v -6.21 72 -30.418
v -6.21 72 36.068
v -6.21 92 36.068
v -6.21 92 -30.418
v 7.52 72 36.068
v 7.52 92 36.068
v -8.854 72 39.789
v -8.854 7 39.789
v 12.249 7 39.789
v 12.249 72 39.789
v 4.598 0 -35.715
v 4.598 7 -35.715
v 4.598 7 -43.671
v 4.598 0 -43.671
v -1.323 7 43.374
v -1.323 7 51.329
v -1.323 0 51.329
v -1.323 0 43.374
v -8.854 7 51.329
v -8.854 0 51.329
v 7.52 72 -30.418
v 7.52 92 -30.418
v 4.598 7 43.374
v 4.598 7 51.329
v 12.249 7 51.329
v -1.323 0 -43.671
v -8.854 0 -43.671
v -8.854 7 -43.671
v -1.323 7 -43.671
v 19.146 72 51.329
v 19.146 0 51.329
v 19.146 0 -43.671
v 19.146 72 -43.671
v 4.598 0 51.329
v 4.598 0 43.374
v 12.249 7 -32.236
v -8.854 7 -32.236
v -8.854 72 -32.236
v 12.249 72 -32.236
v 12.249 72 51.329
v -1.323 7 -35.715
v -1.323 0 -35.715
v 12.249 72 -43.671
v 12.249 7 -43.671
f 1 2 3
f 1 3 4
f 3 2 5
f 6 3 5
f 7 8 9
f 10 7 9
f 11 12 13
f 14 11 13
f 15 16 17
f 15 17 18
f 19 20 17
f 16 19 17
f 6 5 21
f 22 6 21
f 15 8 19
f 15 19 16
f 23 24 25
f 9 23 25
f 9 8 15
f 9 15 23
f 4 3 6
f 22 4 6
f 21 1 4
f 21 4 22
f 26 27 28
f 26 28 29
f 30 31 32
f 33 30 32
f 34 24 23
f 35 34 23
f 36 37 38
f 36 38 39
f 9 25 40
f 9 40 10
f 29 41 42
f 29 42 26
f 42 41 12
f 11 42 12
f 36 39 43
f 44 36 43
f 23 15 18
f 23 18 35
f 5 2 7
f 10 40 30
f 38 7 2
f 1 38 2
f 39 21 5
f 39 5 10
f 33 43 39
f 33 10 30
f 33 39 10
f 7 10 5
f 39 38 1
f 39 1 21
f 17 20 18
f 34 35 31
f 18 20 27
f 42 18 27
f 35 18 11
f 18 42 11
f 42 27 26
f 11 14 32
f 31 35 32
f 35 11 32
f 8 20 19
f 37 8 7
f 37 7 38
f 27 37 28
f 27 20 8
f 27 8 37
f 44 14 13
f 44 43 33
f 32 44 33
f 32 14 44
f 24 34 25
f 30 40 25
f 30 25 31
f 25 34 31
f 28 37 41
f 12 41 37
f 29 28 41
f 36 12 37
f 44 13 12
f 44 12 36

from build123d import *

# Parameters (mm, degrees)
SKETCH1_W           = 28
SKETCH1_H           = 95
BOSS_EXTRUDE1_DEPTH = 72
SKETCH2_W           = 13.730616592
SKETCH2_H           = 66.486096825
BOSS_EXTRUDE2_DEPTH = 20
SKETCH3_W           = 21.103215472
SKETCH3_H           = 11.539971669
SKETCH3_H_2         = 11.43433275
CUT_EXTRUDE1_DEPTH  = 65
SKETCH4_W           = 5.921037469
SKETCH4_H           = 7.955384718
CUT_EXTRUDE2_DEPTH  = 65


with BuildPart() as part:
    # Sketch1 → Boss-Extrude1 (new body)
    with BuildSketch(Plane(origin=(0, 0, 0), x_dir=(1, 0, 0), z_dir=(0, 1, 0))):
        with Locations((5.145873321, -3.829174664)):
            Rectangle(SKETCH1_W, SKETCH1_H)
    extrude(amount=BOSS_EXTRUDE1_DEPTH)

    # Sketch2 → Boss-Extrude2 (add)
    with BuildSketch(Plane(origin=(0, 72, 0), x_dir=(1, 0, 0), z_dir=(0, 1, 0))):
        with Locations((0.655068483, -2.824577048)):
            Rectangle(SKETCH2_W, SKETCH2_H)
    extrude(amount=BOSS_EXTRUDE2_DEPTH)

    # Sketch3 → Cut-Extrude1 (cut)
    with BuildSketch(Plane(origin=(0, 72, 0), x_dir=(1, 0, 0), z_dir=(0, 1, 0))):
        with Locations((1.697481057, -45.55918883)):
            Rectangle(SKETCH3_W, SKETCH3_H)
        with Locations((1.697481057, 37.953658961)):
            Rectangle(SKETCH3_W, SKETCH3_H_2)
    extrude(amount=-CUT_EXTRUDE1_DEPTH, mode=Mode.SUBTRACT)

    # Sketch4 → Cut-Extrude2 (cut)
    with BuildSketch(Plane(origin=(0, 7, 0), x_dir=(1, 0, 0), z_dir=(0, 1, 0))):
        with Locations((1.637392249, -47.351482305)):
            Rectangle(SKETCH4_W, SKETCH4_H)
        with Locations((1.637392249, 39.693132977)):
            Rectangle(SKETCH4_W, SKETCH4_H)
    extrude(amount=-CUT_EXTRUDE2_DEPTH, mode=Mode.SUBTRACT)


solid = part.part
